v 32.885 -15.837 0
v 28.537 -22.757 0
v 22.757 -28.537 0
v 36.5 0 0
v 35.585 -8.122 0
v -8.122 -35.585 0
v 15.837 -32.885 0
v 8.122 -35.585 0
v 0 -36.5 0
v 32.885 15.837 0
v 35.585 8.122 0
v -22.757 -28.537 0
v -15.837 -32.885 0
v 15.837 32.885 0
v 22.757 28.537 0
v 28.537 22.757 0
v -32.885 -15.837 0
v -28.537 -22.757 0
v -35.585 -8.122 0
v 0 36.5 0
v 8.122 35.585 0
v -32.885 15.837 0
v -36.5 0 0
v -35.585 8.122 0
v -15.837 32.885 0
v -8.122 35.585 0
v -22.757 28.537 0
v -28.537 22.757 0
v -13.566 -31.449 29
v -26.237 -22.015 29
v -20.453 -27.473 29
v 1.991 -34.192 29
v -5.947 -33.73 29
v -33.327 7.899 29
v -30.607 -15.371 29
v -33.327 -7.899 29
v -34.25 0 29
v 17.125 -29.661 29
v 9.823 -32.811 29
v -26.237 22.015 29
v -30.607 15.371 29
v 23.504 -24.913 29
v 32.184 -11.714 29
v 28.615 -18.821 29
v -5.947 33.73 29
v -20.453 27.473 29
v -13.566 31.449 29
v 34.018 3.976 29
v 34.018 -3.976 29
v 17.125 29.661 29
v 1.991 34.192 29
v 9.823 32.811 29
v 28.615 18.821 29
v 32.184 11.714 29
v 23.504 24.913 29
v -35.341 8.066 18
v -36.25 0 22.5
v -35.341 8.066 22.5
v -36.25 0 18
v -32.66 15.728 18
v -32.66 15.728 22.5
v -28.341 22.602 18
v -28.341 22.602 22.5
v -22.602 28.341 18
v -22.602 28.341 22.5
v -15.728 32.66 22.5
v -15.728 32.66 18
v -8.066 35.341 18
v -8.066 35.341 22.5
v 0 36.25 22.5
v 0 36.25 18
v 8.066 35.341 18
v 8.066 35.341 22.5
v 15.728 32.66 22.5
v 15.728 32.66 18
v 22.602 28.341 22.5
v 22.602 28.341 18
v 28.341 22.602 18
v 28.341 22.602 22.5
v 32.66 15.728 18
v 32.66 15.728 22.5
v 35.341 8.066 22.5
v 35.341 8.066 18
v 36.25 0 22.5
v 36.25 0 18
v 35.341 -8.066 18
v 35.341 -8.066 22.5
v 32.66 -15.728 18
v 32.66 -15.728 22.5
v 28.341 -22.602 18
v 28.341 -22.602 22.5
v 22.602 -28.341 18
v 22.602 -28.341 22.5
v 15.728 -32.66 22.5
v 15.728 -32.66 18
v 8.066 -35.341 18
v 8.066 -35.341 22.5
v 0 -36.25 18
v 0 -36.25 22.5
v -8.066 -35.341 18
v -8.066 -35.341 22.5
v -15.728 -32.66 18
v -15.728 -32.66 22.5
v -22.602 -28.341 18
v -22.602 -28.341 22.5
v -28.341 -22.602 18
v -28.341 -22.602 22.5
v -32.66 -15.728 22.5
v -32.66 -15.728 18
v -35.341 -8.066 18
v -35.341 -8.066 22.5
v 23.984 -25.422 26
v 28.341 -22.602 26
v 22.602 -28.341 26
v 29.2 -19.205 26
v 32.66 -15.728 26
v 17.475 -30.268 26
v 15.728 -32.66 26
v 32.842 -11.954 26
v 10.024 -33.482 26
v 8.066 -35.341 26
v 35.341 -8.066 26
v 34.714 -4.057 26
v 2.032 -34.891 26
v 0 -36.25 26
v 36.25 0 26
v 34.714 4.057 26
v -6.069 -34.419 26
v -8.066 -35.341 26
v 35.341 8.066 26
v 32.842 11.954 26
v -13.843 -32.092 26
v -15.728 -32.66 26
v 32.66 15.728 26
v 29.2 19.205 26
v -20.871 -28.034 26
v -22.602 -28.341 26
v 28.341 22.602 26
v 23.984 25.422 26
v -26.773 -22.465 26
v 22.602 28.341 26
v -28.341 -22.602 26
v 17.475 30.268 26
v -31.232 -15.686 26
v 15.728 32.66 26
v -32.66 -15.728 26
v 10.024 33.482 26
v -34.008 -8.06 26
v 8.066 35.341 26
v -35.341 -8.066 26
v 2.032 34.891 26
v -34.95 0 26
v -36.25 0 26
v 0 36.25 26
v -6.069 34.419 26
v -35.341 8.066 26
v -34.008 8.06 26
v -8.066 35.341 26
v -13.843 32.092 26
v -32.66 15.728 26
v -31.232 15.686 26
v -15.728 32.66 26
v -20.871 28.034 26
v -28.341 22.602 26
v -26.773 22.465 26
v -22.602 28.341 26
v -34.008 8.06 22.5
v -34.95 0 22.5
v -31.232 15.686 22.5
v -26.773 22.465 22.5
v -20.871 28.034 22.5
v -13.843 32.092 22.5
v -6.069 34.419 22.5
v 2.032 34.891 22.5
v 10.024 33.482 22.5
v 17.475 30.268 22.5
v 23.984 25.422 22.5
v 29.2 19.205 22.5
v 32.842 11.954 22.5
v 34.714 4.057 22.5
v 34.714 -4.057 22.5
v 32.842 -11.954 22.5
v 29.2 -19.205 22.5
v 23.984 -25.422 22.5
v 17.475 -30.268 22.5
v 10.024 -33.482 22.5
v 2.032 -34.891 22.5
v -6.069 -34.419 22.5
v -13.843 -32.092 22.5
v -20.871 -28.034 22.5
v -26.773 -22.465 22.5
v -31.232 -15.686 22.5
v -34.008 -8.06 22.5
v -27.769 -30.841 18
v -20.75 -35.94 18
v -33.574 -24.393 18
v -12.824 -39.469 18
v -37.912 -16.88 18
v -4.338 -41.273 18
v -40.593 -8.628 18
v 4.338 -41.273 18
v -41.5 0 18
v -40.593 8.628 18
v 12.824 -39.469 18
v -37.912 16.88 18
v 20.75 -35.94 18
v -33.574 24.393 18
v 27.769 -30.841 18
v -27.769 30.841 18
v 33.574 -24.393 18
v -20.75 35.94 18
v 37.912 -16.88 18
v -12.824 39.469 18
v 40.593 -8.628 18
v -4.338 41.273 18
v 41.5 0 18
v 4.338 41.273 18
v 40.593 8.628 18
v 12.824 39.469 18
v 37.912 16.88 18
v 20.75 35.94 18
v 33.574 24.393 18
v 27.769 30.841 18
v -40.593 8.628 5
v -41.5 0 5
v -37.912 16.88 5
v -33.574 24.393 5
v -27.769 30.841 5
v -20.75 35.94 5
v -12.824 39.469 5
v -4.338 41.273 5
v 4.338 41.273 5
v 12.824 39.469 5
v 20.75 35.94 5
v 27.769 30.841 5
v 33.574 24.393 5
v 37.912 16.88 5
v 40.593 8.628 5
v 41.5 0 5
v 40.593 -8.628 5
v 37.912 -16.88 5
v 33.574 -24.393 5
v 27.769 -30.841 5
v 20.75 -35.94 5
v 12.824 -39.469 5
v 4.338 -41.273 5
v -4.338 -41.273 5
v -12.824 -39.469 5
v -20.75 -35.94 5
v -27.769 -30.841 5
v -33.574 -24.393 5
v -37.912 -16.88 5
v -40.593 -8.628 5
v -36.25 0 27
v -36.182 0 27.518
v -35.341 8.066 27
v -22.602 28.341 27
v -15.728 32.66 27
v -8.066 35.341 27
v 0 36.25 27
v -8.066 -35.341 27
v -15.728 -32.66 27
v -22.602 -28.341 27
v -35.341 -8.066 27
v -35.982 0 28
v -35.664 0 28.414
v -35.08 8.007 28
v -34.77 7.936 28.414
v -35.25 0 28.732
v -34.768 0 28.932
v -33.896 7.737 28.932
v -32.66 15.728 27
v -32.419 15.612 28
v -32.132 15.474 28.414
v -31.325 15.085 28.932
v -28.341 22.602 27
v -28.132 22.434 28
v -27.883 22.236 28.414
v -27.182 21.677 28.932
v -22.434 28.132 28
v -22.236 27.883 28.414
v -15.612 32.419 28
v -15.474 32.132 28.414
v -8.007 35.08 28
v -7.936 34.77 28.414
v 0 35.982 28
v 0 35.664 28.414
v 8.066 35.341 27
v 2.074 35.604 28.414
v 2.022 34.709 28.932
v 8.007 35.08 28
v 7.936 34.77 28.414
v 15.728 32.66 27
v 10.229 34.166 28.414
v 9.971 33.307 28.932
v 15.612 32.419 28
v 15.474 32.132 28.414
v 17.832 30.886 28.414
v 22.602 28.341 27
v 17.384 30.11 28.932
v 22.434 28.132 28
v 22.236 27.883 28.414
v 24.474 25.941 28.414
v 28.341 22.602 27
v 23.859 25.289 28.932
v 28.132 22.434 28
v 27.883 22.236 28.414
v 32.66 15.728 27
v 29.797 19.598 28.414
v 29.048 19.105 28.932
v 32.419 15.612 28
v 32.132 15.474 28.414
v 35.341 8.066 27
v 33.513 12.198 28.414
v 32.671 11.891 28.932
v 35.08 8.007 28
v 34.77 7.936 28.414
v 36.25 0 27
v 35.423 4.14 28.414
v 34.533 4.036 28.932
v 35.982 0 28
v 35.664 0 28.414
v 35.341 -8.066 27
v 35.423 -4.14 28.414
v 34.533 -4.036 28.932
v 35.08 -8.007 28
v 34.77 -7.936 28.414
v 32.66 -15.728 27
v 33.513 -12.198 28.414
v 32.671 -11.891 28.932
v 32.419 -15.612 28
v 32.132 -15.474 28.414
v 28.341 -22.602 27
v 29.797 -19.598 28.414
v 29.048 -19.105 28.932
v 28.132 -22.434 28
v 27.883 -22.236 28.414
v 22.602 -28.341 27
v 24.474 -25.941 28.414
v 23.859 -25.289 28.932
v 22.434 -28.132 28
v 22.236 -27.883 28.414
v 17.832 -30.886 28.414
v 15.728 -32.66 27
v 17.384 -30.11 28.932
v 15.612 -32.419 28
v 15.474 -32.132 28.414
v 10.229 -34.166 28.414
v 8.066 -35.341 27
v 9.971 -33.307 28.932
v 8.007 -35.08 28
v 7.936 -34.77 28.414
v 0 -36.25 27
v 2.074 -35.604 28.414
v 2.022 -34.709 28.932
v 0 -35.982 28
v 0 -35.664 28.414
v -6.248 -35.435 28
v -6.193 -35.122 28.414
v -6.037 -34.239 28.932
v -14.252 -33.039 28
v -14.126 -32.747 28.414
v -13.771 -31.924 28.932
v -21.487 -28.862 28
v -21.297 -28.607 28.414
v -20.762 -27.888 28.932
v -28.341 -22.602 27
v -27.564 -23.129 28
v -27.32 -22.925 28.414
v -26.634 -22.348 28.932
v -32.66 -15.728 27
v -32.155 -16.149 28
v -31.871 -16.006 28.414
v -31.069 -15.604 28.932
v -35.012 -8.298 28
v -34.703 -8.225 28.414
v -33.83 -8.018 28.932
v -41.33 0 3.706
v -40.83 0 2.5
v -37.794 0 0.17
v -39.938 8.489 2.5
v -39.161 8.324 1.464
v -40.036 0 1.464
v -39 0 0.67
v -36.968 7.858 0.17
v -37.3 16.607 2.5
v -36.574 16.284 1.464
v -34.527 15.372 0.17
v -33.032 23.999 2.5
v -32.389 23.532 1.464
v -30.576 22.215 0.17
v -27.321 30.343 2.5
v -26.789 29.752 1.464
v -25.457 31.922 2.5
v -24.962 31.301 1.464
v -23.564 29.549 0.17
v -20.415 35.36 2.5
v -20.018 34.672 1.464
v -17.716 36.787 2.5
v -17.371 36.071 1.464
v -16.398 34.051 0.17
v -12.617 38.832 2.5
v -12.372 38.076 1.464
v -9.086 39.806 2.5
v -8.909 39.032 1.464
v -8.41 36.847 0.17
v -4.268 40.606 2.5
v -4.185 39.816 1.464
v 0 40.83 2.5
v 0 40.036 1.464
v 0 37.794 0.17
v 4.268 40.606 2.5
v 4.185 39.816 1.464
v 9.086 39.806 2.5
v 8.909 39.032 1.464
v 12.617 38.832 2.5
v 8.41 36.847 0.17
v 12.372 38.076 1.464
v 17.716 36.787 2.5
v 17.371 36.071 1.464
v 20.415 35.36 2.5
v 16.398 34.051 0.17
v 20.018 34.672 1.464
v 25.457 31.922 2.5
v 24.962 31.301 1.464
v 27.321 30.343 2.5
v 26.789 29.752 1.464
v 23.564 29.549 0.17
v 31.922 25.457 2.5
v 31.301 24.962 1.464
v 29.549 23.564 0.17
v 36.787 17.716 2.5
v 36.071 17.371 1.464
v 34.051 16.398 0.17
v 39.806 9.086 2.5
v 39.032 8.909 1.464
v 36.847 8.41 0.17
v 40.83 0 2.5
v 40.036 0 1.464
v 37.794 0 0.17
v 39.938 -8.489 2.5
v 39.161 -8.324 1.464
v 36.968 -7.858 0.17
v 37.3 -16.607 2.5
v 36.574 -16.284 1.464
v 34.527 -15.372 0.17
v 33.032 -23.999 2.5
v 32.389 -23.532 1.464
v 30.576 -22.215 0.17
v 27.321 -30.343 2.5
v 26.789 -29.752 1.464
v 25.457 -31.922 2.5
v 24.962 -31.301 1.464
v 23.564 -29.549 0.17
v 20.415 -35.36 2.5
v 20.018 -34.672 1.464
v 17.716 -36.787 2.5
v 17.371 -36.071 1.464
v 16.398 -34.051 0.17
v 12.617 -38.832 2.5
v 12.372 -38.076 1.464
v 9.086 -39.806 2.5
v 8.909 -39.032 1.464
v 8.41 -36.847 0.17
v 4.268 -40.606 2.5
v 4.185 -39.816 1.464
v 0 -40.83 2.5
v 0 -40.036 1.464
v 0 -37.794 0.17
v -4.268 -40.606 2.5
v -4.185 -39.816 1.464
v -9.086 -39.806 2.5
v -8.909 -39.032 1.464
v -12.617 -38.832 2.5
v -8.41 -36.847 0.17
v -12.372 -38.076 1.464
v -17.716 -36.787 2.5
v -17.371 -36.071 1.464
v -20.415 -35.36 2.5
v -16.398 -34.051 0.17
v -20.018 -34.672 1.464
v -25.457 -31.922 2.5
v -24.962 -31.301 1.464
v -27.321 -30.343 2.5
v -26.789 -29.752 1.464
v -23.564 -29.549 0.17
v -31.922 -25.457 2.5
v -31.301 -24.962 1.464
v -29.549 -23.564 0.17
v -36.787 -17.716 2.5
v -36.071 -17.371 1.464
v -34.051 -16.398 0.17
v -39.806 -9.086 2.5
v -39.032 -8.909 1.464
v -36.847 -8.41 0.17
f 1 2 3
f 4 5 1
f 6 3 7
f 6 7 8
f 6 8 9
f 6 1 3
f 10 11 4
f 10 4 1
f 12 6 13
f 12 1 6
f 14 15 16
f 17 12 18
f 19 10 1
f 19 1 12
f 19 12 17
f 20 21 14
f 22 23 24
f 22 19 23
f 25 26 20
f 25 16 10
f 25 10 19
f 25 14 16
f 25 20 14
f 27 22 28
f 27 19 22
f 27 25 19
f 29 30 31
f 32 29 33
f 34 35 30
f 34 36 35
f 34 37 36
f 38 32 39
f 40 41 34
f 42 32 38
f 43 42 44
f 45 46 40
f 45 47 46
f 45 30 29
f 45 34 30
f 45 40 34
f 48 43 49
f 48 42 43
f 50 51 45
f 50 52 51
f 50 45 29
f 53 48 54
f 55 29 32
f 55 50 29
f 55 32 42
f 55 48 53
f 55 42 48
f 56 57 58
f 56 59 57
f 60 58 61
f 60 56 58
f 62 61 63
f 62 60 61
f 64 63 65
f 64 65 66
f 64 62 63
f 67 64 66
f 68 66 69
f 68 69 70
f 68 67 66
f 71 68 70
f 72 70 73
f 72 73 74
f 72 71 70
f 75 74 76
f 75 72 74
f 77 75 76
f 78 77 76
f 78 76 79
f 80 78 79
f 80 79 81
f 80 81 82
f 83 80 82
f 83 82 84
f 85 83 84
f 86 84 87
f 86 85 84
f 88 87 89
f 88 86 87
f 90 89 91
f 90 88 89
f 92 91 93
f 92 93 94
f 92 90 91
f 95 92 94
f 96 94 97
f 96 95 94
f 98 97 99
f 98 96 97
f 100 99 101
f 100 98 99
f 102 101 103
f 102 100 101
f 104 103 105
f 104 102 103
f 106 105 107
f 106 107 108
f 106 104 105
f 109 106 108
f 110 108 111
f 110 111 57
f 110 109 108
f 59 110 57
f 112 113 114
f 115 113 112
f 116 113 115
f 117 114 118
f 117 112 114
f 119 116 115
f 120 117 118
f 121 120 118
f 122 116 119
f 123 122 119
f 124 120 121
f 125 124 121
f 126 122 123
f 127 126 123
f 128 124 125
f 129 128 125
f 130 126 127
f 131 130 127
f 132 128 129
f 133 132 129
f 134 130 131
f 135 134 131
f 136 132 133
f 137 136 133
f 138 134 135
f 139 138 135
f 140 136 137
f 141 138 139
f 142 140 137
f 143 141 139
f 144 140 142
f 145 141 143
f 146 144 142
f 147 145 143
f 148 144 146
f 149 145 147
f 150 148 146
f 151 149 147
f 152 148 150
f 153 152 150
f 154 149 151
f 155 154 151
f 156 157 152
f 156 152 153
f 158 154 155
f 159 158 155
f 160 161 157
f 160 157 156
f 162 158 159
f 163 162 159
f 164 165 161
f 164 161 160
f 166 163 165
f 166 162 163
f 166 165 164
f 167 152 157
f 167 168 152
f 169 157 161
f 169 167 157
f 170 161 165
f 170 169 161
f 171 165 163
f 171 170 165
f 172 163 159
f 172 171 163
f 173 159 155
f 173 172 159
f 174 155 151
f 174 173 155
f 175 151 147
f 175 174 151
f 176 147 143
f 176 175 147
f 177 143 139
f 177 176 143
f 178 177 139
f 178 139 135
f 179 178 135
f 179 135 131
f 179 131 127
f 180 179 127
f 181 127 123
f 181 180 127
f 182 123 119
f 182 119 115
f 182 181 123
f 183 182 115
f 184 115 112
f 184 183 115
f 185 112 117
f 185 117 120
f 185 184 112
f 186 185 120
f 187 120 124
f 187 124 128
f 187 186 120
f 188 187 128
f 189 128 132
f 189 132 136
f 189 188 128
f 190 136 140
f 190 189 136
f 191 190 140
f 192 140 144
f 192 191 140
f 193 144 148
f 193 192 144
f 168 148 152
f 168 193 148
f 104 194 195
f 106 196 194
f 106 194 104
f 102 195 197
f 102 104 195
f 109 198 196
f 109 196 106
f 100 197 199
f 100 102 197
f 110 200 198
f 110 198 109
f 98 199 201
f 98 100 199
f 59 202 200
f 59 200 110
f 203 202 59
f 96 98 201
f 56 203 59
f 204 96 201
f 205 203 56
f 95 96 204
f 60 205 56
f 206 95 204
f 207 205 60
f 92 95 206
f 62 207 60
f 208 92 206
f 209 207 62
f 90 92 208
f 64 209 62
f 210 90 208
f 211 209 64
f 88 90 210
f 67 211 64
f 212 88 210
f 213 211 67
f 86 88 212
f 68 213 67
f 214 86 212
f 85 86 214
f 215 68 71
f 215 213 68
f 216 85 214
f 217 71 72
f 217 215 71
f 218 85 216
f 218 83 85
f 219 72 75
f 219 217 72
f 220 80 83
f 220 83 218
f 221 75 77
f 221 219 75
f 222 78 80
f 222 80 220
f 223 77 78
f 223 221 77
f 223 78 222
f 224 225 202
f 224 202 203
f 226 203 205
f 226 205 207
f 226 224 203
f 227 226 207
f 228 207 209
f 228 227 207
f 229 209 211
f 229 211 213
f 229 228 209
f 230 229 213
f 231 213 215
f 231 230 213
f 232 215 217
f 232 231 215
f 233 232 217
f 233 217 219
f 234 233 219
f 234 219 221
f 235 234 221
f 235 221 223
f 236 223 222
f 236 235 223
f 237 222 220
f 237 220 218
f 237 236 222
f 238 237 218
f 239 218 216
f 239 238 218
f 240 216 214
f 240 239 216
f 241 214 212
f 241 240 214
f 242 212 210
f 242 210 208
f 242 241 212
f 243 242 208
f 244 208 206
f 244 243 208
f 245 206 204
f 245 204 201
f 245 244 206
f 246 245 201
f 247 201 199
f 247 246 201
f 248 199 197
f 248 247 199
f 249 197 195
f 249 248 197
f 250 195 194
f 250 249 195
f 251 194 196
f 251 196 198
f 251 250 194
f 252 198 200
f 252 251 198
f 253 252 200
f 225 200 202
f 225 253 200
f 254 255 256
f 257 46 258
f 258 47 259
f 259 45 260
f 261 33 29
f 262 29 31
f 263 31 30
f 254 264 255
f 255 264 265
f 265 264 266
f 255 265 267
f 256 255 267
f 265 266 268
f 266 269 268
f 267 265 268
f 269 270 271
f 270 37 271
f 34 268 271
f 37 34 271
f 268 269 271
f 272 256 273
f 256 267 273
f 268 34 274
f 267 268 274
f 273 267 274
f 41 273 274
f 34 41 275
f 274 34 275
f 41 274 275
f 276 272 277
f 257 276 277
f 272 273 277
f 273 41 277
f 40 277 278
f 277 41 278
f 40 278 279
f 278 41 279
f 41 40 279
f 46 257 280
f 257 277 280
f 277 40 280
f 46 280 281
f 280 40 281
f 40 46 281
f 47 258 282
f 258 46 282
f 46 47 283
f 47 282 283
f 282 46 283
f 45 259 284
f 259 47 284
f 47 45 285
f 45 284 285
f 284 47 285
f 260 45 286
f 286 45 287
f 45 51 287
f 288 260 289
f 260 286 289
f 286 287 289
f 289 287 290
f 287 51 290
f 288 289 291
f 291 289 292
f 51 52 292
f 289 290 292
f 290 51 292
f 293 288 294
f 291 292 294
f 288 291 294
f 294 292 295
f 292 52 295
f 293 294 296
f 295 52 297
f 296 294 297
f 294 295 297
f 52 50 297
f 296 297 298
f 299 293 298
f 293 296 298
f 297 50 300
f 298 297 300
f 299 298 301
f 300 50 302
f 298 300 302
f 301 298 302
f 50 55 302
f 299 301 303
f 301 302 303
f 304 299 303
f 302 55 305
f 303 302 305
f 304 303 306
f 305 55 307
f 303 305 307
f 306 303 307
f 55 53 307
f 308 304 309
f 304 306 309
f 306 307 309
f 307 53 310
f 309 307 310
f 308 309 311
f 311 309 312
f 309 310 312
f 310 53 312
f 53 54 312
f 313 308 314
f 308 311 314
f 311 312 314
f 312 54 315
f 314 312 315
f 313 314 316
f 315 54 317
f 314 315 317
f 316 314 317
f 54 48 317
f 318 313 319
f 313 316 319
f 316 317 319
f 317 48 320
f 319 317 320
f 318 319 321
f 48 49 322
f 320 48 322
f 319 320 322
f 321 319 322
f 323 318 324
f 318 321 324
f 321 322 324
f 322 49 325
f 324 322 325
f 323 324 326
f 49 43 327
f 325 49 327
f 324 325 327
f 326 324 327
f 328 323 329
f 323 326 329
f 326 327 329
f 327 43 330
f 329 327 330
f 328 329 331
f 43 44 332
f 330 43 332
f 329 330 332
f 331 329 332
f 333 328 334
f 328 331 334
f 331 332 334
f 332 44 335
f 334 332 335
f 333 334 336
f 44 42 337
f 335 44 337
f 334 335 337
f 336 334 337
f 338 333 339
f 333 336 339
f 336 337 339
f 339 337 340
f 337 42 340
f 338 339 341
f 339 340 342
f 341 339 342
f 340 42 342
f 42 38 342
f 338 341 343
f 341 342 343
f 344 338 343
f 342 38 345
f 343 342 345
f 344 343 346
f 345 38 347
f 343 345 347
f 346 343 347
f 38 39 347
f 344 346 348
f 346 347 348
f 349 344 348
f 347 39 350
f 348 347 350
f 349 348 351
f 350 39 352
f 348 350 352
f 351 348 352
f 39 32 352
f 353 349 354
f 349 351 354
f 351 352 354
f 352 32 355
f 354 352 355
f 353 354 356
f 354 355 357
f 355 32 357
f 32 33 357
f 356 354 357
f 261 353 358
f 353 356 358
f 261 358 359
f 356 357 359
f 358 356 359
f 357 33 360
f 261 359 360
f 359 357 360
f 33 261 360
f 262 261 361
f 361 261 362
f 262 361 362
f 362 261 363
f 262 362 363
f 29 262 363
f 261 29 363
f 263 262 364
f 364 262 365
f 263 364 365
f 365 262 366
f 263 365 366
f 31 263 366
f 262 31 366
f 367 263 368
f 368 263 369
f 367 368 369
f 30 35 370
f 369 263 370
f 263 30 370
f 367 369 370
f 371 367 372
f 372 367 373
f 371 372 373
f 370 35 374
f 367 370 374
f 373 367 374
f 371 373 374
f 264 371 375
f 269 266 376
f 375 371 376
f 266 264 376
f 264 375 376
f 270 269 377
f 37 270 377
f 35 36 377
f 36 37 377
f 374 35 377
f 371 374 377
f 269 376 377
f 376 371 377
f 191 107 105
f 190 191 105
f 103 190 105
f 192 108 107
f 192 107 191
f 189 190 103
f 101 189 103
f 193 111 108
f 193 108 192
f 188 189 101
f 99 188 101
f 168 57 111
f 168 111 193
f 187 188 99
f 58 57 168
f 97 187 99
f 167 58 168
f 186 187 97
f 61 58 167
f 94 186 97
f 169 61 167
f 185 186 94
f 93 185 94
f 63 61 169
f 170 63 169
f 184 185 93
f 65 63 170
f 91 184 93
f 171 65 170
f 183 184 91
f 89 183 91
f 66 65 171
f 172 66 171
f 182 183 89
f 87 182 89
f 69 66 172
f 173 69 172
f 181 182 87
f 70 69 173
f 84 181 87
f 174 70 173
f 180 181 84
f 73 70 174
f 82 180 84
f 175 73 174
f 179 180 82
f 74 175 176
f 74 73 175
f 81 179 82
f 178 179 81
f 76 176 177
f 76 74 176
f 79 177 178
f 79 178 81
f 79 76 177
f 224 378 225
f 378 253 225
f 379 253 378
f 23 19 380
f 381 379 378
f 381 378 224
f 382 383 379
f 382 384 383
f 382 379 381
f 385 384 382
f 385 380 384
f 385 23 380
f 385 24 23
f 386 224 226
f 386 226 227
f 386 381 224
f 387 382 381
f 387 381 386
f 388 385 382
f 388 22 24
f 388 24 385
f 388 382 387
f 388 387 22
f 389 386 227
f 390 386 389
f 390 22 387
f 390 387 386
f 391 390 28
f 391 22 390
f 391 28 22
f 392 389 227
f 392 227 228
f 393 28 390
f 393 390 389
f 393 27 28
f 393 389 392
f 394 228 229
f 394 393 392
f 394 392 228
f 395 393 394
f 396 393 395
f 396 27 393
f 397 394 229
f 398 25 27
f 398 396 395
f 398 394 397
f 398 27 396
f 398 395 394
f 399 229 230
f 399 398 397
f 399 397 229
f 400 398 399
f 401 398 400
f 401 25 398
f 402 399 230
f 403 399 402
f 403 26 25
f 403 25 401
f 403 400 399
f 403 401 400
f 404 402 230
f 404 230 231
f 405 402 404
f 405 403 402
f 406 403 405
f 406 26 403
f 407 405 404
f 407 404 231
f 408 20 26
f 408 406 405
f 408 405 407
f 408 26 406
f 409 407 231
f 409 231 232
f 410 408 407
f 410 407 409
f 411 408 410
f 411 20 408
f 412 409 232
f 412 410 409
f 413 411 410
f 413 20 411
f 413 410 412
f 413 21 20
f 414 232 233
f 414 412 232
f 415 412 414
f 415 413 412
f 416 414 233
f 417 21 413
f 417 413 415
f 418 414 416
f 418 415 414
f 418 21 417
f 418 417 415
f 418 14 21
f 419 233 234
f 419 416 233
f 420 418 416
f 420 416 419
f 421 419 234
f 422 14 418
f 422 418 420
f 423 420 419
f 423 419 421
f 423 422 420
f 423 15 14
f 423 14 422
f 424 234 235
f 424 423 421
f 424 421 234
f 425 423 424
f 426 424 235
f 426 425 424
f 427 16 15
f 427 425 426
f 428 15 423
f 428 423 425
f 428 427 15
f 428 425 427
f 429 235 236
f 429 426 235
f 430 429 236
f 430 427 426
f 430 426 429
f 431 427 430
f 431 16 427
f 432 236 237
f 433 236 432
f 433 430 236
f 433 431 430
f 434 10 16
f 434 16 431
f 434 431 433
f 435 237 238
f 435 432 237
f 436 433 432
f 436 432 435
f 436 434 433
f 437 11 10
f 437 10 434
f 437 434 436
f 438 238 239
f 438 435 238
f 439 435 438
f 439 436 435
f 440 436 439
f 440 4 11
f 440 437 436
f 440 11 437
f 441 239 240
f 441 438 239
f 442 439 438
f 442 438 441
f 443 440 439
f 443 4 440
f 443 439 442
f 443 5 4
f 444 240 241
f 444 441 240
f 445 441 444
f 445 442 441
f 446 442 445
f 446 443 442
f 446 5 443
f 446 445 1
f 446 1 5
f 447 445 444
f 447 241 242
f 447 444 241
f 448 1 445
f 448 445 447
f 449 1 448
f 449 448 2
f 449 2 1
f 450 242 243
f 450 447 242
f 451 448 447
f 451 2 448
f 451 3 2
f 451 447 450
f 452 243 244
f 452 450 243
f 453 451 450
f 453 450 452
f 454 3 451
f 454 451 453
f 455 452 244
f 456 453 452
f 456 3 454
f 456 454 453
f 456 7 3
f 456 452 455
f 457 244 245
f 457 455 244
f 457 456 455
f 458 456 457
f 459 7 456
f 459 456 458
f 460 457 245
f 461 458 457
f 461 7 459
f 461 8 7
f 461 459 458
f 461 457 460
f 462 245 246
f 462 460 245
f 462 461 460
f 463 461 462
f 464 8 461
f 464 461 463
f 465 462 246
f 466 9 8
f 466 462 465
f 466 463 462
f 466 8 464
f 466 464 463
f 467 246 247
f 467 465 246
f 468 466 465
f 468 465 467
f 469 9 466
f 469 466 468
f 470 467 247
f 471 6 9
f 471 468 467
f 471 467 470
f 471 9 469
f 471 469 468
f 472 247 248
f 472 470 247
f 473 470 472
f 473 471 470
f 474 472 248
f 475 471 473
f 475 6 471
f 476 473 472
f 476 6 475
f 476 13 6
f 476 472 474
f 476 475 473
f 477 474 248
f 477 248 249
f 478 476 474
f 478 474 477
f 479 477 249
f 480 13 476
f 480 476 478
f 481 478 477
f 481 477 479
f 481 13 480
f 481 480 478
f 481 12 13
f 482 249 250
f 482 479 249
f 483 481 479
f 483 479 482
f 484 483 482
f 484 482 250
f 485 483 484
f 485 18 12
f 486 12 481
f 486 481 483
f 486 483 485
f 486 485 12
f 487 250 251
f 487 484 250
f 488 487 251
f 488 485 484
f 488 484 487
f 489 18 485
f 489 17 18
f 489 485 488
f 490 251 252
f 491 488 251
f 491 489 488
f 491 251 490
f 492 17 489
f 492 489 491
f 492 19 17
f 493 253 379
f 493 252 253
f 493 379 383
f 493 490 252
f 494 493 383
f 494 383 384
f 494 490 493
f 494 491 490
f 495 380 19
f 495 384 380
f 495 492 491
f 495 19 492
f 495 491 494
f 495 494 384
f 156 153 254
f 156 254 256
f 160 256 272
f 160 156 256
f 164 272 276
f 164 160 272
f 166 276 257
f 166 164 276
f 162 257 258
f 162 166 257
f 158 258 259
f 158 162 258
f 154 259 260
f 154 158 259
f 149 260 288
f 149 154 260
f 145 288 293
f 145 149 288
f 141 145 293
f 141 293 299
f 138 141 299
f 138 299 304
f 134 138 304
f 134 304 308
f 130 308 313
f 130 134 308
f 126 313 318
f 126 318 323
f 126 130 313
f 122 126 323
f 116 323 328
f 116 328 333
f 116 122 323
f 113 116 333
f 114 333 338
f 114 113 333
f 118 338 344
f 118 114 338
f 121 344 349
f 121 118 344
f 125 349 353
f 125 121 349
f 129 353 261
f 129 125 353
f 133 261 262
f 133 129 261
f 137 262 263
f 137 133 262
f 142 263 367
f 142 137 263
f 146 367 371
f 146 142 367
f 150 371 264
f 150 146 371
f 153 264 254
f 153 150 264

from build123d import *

# Parameters (mm, degrees)
F2_R = 5
F3_R = 2


with BuildPart() as f1:
    # F0 (on Front) → F1 (revolve)
    with BuildSketch(Plane.XZ):
        Polygon((-36.25, 22.5), (-36.25, 18), (-41.5, 18), (-41.5, 0), (0, 0), (0, 18), (0, 29), (-36.25, 29), (-36.25, 26), (-34.95, 26), (-34.95, 22.5), align=None)
    revolve(axis=Axis((0, 0, 9), (0, 0, -1)))

    # F2
    f2_edges = [f1.edges().sort_by_distance(p)[0] for p in [
        (41.5, 0, 0),
    ]]
    fillet(f2_edges, radius=F2_R)

    # F3
    f3_edges = [f1.edges().sort_by_distance(p)[0] for p in [
        (36.25, 0, 29),
    ]]
    fillet(f3_edges, radius=F3_R)


solid = f1.part
